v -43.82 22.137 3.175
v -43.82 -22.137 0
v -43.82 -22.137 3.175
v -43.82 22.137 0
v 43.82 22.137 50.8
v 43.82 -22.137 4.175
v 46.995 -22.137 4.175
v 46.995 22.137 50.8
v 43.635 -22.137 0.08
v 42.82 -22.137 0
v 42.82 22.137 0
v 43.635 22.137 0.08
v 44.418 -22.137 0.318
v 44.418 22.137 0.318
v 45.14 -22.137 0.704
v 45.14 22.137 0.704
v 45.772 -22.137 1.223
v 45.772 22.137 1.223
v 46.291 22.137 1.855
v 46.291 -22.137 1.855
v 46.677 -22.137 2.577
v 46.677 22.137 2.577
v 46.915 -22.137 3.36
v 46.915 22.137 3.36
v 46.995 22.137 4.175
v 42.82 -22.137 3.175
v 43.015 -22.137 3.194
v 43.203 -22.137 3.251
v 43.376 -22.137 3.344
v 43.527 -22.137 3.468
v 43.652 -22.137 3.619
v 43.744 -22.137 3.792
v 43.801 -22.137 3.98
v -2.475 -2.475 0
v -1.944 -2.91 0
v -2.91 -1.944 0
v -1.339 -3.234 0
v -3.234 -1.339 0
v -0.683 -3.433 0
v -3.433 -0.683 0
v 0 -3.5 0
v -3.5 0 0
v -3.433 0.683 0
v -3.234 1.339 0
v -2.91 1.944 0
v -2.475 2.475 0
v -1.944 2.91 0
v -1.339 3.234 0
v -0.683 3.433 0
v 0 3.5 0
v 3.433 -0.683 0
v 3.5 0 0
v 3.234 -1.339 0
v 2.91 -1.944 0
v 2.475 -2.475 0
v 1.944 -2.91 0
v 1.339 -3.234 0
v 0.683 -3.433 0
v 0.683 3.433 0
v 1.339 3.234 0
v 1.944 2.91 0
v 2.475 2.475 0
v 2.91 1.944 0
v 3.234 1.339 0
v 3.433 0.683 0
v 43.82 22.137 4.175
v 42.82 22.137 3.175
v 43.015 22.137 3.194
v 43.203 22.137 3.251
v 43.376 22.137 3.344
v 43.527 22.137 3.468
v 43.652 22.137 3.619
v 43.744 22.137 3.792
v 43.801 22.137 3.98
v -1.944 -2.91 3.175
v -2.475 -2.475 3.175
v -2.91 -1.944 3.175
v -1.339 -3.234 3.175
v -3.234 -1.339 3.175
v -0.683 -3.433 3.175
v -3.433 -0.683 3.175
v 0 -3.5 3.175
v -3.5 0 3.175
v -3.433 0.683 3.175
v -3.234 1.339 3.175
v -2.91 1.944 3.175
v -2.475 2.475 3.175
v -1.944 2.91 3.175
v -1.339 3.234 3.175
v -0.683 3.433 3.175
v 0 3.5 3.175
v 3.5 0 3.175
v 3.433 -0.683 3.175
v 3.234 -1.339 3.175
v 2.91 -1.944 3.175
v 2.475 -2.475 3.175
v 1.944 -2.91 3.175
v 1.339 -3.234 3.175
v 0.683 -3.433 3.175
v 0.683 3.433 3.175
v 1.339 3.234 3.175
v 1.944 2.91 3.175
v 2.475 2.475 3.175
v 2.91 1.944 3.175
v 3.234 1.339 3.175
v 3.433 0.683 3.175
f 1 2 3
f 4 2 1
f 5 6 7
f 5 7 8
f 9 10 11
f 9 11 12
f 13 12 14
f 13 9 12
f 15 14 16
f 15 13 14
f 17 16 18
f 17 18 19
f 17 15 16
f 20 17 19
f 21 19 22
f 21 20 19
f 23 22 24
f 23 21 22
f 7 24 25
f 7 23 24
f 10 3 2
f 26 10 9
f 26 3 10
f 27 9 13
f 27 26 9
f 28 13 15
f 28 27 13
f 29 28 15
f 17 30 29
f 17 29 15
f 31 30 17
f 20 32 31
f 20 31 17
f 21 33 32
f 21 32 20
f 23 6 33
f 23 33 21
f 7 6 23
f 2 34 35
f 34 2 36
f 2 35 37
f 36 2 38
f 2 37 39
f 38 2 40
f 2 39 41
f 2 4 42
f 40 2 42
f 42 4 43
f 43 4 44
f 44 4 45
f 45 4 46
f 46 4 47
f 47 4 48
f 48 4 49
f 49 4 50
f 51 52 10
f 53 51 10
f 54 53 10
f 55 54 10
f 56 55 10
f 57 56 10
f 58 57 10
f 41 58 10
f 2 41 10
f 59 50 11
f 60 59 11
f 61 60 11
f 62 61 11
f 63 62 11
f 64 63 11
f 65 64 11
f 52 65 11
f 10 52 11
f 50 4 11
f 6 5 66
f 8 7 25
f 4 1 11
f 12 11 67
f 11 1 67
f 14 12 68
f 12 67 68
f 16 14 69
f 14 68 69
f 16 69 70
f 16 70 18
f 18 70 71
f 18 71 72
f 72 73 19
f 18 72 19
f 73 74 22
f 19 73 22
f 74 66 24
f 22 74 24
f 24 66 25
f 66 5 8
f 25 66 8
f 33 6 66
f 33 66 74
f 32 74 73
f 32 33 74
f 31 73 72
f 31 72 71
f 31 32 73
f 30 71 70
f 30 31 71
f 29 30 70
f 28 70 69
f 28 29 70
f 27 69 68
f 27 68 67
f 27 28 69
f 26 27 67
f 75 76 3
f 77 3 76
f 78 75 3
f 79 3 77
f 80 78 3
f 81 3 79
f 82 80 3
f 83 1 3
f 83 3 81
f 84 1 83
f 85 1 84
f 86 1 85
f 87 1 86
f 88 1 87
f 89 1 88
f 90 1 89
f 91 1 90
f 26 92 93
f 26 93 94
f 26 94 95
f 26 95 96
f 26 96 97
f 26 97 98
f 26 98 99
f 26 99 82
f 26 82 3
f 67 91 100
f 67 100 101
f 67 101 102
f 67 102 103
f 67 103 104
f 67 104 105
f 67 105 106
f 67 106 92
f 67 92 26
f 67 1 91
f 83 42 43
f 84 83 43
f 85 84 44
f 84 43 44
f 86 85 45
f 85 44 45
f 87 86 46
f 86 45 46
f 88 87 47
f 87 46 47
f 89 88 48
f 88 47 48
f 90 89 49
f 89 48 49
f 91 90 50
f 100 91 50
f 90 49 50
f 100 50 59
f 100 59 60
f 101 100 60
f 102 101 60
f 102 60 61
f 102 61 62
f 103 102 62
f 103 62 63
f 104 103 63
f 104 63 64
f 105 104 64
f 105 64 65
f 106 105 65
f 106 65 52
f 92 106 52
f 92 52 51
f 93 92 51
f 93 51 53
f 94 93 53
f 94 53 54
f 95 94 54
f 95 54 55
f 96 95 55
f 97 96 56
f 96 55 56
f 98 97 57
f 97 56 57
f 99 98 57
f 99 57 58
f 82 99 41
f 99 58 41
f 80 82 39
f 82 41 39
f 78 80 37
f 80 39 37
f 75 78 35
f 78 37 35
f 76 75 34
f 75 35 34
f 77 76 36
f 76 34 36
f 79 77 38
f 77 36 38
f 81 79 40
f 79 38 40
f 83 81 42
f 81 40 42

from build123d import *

# Parameters (mm, degrees)
SKETCH1_W                    = 87.64016
SKETCH1_H                    = 44.27474
SKETCH1_R                    = 3
BASE_FLANGE1_DEPTH           = 3.175
EDGE_FLANGE2_STRIP_W         = 14.7
EDGE_FLANGE2_STRIP_H         = 3.175
EDGE_FLANGE2_STRIP_CUT_DEPTH = 44.27474
EDGE_FLANGE2_DEPTH           = 44.27474
CUT_EXTRUDE2_DEPTH           = 107.386542553
CUT_EXTRUDE2_DEPTH_BACK      = 3.175
M6_CLEARANCE_HOLE2_D         = 7
M6_CLEARANCE_HOLE2_DEPTH     = 3.175


# Sheet-metal steps are written as plain solids
with BuildPart() as part:
    # Sketch1 → Base-Flange1 (new body)
    with BuildSketch(Plane.XY):
        Rectangle(SKETCH1_W, SKETCH1_H)
        Circle(SKETCH1_R, mode=Mode.SUBTRACT)
    extrude(amount=BASE_FLANGE1_DEPTH)

    # Edge-Flange2 strip (across the edge) → Edge-Flange2 strip cut (cut)
    with BuildSketch(Plane(origin=(43.82008, -22.13737, 3.175), x_dir=(-1, 0, 0), z_dir=(0, 1, 0))):
        with Locations((-6.35, -1.5875)):
            Rectangle(EDGE_FLANGE2_STRIP_W, EDGE_FLANGE2_STRIP_H)
    extrude(amount=EDGE_FLANGE2_STRIP_CUT_DEPTH, mode=Mode.SUBTRACT)

    # Edge-Flange2 section (across the edge) → Edge-Flange2 (add)
    with BuildSketch(Plane(origin=(43.82008, -22.13737, 3.175), x_dir=(-1, 0, 0), z_dir=(0, 1, 0))):
        with BuildLine():
            Line((-3.175, 1), (-3.175, 47.625))
            Line((-3.175, 47.625), (0, 47.625))
            Line((0, 47.625), (0, 1))
            ThreePointArc((0, 1), (0.292893219, 0.292893219), (1, 0))
            Line((1, 0), (1, -3.175))
            ThreePointArc((1, -3.175), (-1.952170811, -1.952170811), (-3.175, 1))
        make_face()
    extrude(amount=EDGE_FLANGE2_DEPTH)

    # Sketch13 → Cut-Extrude2 (cut, two sides: drawn at the far end of the back side and taken through both)
    with BuildSketch(Plane(origin=(46.99508, 0, 0), x_dir=(0, 0, -1), z_dir=(1, 0, 0)).offset(-CUT_EXTRUDE2_DEPTH_BACK)):
        Polygon((-4.175, -22.13737), (-50.8, 22.13737), (-50.8, -22.13737), align=None)
    extrude(amount=CUT_EXTRUDE2_DEPTH + CUT_EXTRUDE2_DEPTH_BACK, mode=Mode.SUBTRACT)

    # M6 Clearance Hole2
    with Locations(Plane.XY.offset(3.175)):
        with Locations((0, 0)):
            Hole(M6_CLEARANCE_HOLE2_D / 2, depth=M6_CLEARANCE_HOLE2_DEPTH)


solid = part.part
